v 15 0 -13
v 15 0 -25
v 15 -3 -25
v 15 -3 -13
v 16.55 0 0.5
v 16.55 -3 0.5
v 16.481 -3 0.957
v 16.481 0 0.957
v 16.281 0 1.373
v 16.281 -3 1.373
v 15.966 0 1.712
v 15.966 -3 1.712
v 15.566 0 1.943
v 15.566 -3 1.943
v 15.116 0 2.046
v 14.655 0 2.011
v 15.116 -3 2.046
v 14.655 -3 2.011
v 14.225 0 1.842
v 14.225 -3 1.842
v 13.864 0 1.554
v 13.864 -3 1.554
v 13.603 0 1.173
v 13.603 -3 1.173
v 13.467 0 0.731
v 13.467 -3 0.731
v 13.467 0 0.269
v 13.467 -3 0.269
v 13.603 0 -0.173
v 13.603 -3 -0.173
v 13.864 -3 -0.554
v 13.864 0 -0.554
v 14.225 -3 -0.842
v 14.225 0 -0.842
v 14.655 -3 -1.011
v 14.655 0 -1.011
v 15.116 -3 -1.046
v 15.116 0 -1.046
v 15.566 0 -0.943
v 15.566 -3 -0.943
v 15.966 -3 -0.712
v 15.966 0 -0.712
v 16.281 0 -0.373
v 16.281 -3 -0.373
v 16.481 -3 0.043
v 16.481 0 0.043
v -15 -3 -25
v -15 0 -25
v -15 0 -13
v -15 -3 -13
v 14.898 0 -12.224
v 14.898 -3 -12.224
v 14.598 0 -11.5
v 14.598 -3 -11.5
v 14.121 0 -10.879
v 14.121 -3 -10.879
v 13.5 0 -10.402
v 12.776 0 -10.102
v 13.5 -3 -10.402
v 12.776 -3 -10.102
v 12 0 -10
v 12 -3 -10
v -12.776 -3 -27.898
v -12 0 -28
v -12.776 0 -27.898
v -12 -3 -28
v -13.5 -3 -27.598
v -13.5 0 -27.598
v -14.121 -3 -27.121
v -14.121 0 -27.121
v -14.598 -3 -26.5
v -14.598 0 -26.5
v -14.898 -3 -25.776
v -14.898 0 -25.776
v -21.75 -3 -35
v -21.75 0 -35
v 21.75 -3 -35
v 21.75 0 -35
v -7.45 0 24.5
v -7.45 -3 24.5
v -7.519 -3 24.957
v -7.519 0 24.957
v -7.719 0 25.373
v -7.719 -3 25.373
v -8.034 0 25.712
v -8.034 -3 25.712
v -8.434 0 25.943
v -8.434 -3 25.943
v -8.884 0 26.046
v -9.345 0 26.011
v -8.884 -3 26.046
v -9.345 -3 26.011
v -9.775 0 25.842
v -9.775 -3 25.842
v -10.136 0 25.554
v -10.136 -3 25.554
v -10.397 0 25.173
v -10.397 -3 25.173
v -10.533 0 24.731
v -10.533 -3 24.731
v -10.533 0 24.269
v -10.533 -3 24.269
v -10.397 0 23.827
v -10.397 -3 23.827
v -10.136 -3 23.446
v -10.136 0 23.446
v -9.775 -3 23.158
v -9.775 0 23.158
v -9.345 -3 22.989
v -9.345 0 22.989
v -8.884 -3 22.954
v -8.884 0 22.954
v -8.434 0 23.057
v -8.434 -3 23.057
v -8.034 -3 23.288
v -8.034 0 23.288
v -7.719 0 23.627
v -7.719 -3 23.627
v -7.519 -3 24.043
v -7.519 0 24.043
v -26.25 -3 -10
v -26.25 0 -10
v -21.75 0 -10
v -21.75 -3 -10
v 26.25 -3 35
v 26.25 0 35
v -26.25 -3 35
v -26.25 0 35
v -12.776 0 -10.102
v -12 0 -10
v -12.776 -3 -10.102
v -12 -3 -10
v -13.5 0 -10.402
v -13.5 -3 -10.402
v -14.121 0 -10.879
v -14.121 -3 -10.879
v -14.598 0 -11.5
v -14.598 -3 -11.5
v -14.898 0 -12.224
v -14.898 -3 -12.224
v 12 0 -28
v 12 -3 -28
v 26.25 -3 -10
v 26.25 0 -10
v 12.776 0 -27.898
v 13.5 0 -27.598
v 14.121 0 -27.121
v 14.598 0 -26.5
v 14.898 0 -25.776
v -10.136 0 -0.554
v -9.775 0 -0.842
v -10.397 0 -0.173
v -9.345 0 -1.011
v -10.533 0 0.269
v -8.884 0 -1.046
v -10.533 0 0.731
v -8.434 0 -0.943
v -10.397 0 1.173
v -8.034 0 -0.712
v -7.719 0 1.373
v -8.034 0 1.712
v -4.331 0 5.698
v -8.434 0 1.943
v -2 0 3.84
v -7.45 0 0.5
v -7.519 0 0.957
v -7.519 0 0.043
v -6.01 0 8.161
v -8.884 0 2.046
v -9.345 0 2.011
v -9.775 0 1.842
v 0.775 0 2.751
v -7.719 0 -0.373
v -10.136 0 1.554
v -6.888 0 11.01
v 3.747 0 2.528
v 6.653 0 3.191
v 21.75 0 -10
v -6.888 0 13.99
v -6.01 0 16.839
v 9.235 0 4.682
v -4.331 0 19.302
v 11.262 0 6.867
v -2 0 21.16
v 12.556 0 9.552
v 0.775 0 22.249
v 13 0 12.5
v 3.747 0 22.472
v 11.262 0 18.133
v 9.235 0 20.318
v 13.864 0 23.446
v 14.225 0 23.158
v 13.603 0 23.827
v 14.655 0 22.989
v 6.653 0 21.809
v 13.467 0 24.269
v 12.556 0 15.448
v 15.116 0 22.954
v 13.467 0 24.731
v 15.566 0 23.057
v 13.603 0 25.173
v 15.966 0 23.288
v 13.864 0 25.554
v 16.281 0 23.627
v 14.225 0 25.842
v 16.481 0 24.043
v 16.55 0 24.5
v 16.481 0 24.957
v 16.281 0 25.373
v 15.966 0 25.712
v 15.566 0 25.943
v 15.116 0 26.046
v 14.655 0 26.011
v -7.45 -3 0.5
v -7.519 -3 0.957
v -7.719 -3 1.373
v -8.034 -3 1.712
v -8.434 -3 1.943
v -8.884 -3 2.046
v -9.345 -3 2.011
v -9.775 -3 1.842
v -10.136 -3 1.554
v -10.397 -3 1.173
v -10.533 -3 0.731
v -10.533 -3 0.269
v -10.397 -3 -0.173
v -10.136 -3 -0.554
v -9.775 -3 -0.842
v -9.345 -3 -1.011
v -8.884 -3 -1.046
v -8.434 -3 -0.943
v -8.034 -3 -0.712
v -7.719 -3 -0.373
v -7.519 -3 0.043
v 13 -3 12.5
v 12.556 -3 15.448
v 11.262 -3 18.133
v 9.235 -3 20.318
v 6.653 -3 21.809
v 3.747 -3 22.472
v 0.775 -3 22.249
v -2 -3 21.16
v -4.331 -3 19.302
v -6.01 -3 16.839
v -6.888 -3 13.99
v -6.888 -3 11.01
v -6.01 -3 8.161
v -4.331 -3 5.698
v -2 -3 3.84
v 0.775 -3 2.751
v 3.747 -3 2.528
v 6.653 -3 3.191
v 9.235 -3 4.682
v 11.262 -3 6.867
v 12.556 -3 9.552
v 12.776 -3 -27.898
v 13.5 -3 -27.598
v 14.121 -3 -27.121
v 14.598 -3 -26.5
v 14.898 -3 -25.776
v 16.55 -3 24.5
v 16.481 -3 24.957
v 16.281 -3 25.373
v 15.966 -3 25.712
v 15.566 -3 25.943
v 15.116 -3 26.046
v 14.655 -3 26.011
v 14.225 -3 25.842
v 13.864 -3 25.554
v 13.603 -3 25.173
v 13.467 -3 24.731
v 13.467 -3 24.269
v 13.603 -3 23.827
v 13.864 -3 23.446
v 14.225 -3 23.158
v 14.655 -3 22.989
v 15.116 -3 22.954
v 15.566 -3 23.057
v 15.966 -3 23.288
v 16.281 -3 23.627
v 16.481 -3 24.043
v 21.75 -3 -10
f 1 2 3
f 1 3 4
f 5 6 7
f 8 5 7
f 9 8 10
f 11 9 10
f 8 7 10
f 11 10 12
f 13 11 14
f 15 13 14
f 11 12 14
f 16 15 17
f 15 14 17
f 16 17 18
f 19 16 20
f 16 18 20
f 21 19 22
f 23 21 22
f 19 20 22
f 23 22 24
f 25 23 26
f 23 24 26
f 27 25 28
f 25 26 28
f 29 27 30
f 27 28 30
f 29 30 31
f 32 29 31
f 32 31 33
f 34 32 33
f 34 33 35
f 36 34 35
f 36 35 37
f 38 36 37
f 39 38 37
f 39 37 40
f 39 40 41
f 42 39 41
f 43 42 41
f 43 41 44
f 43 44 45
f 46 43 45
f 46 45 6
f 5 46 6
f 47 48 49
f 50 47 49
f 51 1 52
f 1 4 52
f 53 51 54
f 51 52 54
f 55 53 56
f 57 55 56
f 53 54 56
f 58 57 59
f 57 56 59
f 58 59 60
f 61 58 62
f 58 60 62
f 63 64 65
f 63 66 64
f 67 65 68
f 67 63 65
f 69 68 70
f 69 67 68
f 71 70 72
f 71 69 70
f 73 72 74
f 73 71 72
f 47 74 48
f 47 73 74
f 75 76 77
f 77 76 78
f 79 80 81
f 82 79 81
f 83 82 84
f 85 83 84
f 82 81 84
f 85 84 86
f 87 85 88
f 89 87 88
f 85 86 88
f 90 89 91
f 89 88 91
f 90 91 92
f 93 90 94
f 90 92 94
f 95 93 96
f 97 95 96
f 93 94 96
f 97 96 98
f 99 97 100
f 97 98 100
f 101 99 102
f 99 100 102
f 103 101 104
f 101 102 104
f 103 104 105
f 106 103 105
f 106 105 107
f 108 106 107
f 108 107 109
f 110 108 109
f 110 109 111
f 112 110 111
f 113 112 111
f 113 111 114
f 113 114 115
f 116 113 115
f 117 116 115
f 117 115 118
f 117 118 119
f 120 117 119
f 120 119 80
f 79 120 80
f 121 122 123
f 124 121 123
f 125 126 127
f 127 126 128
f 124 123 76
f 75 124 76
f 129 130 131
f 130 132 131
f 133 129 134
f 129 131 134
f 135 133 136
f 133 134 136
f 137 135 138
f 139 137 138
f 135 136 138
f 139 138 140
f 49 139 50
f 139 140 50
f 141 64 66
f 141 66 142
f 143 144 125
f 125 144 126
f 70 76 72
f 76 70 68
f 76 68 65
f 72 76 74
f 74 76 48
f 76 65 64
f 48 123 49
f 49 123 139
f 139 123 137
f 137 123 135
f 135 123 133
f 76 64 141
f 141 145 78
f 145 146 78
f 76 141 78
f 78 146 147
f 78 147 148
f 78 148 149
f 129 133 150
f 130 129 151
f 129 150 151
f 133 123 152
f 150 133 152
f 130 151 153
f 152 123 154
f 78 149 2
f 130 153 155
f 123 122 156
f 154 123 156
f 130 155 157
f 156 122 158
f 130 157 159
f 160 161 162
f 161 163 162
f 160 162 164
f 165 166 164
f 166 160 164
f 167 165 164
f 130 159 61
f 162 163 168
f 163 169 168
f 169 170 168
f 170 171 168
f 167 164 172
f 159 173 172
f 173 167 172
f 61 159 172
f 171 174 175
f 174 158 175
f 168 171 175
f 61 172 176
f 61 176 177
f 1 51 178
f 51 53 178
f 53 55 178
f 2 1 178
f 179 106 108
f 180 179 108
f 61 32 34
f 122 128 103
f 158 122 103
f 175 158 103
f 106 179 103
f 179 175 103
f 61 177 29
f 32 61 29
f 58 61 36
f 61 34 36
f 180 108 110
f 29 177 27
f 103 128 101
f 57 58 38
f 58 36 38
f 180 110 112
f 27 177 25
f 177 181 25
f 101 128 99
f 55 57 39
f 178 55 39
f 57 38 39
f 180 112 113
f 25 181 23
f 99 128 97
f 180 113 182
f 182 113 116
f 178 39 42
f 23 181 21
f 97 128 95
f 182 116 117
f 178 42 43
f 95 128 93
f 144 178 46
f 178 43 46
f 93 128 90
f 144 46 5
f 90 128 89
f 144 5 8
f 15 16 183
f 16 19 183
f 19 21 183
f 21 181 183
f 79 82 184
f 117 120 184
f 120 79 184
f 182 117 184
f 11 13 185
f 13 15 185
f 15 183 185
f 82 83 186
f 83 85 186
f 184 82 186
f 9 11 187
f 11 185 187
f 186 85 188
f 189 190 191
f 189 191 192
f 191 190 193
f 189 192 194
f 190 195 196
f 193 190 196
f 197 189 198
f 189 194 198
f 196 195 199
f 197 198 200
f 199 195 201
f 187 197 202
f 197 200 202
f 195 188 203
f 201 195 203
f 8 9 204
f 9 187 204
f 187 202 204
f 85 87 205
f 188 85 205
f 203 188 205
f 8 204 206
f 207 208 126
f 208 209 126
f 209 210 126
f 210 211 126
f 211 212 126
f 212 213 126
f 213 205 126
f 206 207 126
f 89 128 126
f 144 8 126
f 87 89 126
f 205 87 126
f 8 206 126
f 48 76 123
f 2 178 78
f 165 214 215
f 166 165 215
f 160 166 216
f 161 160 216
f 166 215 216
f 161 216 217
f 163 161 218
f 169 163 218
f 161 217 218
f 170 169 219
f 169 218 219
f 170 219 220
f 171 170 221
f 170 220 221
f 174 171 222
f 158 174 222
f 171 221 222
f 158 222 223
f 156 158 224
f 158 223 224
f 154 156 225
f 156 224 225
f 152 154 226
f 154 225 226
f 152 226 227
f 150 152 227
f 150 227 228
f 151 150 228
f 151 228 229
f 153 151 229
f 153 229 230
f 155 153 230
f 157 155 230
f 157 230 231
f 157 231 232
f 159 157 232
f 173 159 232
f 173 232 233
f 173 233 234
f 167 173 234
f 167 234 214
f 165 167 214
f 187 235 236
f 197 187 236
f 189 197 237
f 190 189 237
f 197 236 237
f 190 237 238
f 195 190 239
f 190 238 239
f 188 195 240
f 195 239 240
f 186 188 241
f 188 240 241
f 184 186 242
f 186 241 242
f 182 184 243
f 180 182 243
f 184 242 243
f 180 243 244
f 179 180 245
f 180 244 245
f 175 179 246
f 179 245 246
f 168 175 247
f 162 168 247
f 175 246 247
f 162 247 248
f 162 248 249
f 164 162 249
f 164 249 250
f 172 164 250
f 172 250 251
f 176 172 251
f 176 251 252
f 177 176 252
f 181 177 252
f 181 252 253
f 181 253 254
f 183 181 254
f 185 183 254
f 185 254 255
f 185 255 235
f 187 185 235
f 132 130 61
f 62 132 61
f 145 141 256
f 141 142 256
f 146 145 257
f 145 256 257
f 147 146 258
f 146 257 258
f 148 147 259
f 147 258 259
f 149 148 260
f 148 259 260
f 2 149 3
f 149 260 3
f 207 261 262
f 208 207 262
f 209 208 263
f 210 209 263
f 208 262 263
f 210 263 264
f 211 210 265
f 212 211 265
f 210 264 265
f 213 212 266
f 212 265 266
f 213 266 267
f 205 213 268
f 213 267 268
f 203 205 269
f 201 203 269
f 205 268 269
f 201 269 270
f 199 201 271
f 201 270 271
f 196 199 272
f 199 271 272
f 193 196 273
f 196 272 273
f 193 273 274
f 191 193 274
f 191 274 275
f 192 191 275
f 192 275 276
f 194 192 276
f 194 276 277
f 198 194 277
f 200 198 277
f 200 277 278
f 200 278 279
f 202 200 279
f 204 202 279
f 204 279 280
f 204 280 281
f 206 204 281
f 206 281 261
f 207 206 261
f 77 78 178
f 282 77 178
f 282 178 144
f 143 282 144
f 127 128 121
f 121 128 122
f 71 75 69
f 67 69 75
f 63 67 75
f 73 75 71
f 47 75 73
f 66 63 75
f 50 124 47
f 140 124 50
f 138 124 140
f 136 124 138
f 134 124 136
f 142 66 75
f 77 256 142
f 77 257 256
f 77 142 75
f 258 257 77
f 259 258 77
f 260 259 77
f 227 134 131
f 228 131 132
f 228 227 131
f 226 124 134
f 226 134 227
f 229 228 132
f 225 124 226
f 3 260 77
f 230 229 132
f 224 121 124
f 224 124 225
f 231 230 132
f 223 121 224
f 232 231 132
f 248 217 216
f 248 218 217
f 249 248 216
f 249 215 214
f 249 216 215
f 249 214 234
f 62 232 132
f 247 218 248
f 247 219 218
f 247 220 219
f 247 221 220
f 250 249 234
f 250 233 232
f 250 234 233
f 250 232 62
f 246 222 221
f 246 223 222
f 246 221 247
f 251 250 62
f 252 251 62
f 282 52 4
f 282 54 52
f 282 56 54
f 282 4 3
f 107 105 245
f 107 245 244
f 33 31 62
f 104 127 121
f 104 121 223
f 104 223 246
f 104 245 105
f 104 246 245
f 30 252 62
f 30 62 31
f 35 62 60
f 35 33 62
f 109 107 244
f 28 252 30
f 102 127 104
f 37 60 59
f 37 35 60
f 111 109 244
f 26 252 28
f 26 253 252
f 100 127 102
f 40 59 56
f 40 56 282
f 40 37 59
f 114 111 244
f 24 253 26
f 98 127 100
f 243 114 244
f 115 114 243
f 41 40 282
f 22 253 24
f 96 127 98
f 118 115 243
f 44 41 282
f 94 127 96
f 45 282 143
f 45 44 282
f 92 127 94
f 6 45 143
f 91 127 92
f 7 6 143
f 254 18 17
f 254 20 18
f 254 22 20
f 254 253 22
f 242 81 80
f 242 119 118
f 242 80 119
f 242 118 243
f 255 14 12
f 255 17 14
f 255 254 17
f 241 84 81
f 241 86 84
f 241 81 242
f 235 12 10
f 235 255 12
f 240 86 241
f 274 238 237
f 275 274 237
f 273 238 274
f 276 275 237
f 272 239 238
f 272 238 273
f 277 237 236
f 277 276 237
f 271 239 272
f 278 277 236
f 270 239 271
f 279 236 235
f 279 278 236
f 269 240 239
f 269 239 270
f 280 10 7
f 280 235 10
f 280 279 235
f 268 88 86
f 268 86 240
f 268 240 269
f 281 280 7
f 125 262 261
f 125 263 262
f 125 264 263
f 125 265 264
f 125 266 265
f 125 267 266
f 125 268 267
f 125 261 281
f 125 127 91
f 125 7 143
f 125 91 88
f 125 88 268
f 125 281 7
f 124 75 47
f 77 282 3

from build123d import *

# Parameters (mm, degrees)
F0_W     = 30
F0_H     = 18
F1_DEPTH = 3
F2_R     = 3
F3_R     = 1.55
F3_R_2   = 10
F4_DEPTH = 3.001


with BuildPart() as f1:
    # F0 (on Front) → F1 (new body)
    with BuildSketch(Plane.XZ):
        Polygon((-21.75, -10), (-21.75, -35), (21.75, -35), (21.75, -10), (26.25, -10), (26.25, 35), (-26.25, 35), (-26.25, -10), align=None)
        with Locations((0, -19)):
            Rectangle(F0_W, F0_H, mode=Mode.SUBTRACT)
    extrude(amount=F1_DEPTH)

    # F2
    f2_edges = [f1.edges().sort_by_distance(p)[0] for p in [
        (-15, -1.5, -28),
        (15, -1.5, -28),
        (15, -1.5, -10),
        (-15, -1.5, -10),
    ]]
    fillet(f2_edges, radius=F2_R)

    # F3 (on face) → F4 (cut, through all)
    with BuildSketch(Plane.XZ.offset(3)):
        with Locations((-9, 24.5)):
            Circle(F3_R)
        with Locations((15, 24.5)):
            Circle(F3_R)
        with Locations((-9, 0.5)):
            Circle(F3_R)
        with Locations((15, 0.5)):
            Circle(F3_R)
        with Locations((3, 12.5)):
            Circle(F3_R_2)
    extrude(amount=-F4_DEPTH, mode=Mode.SUBTRACT)


solid = f1.part
